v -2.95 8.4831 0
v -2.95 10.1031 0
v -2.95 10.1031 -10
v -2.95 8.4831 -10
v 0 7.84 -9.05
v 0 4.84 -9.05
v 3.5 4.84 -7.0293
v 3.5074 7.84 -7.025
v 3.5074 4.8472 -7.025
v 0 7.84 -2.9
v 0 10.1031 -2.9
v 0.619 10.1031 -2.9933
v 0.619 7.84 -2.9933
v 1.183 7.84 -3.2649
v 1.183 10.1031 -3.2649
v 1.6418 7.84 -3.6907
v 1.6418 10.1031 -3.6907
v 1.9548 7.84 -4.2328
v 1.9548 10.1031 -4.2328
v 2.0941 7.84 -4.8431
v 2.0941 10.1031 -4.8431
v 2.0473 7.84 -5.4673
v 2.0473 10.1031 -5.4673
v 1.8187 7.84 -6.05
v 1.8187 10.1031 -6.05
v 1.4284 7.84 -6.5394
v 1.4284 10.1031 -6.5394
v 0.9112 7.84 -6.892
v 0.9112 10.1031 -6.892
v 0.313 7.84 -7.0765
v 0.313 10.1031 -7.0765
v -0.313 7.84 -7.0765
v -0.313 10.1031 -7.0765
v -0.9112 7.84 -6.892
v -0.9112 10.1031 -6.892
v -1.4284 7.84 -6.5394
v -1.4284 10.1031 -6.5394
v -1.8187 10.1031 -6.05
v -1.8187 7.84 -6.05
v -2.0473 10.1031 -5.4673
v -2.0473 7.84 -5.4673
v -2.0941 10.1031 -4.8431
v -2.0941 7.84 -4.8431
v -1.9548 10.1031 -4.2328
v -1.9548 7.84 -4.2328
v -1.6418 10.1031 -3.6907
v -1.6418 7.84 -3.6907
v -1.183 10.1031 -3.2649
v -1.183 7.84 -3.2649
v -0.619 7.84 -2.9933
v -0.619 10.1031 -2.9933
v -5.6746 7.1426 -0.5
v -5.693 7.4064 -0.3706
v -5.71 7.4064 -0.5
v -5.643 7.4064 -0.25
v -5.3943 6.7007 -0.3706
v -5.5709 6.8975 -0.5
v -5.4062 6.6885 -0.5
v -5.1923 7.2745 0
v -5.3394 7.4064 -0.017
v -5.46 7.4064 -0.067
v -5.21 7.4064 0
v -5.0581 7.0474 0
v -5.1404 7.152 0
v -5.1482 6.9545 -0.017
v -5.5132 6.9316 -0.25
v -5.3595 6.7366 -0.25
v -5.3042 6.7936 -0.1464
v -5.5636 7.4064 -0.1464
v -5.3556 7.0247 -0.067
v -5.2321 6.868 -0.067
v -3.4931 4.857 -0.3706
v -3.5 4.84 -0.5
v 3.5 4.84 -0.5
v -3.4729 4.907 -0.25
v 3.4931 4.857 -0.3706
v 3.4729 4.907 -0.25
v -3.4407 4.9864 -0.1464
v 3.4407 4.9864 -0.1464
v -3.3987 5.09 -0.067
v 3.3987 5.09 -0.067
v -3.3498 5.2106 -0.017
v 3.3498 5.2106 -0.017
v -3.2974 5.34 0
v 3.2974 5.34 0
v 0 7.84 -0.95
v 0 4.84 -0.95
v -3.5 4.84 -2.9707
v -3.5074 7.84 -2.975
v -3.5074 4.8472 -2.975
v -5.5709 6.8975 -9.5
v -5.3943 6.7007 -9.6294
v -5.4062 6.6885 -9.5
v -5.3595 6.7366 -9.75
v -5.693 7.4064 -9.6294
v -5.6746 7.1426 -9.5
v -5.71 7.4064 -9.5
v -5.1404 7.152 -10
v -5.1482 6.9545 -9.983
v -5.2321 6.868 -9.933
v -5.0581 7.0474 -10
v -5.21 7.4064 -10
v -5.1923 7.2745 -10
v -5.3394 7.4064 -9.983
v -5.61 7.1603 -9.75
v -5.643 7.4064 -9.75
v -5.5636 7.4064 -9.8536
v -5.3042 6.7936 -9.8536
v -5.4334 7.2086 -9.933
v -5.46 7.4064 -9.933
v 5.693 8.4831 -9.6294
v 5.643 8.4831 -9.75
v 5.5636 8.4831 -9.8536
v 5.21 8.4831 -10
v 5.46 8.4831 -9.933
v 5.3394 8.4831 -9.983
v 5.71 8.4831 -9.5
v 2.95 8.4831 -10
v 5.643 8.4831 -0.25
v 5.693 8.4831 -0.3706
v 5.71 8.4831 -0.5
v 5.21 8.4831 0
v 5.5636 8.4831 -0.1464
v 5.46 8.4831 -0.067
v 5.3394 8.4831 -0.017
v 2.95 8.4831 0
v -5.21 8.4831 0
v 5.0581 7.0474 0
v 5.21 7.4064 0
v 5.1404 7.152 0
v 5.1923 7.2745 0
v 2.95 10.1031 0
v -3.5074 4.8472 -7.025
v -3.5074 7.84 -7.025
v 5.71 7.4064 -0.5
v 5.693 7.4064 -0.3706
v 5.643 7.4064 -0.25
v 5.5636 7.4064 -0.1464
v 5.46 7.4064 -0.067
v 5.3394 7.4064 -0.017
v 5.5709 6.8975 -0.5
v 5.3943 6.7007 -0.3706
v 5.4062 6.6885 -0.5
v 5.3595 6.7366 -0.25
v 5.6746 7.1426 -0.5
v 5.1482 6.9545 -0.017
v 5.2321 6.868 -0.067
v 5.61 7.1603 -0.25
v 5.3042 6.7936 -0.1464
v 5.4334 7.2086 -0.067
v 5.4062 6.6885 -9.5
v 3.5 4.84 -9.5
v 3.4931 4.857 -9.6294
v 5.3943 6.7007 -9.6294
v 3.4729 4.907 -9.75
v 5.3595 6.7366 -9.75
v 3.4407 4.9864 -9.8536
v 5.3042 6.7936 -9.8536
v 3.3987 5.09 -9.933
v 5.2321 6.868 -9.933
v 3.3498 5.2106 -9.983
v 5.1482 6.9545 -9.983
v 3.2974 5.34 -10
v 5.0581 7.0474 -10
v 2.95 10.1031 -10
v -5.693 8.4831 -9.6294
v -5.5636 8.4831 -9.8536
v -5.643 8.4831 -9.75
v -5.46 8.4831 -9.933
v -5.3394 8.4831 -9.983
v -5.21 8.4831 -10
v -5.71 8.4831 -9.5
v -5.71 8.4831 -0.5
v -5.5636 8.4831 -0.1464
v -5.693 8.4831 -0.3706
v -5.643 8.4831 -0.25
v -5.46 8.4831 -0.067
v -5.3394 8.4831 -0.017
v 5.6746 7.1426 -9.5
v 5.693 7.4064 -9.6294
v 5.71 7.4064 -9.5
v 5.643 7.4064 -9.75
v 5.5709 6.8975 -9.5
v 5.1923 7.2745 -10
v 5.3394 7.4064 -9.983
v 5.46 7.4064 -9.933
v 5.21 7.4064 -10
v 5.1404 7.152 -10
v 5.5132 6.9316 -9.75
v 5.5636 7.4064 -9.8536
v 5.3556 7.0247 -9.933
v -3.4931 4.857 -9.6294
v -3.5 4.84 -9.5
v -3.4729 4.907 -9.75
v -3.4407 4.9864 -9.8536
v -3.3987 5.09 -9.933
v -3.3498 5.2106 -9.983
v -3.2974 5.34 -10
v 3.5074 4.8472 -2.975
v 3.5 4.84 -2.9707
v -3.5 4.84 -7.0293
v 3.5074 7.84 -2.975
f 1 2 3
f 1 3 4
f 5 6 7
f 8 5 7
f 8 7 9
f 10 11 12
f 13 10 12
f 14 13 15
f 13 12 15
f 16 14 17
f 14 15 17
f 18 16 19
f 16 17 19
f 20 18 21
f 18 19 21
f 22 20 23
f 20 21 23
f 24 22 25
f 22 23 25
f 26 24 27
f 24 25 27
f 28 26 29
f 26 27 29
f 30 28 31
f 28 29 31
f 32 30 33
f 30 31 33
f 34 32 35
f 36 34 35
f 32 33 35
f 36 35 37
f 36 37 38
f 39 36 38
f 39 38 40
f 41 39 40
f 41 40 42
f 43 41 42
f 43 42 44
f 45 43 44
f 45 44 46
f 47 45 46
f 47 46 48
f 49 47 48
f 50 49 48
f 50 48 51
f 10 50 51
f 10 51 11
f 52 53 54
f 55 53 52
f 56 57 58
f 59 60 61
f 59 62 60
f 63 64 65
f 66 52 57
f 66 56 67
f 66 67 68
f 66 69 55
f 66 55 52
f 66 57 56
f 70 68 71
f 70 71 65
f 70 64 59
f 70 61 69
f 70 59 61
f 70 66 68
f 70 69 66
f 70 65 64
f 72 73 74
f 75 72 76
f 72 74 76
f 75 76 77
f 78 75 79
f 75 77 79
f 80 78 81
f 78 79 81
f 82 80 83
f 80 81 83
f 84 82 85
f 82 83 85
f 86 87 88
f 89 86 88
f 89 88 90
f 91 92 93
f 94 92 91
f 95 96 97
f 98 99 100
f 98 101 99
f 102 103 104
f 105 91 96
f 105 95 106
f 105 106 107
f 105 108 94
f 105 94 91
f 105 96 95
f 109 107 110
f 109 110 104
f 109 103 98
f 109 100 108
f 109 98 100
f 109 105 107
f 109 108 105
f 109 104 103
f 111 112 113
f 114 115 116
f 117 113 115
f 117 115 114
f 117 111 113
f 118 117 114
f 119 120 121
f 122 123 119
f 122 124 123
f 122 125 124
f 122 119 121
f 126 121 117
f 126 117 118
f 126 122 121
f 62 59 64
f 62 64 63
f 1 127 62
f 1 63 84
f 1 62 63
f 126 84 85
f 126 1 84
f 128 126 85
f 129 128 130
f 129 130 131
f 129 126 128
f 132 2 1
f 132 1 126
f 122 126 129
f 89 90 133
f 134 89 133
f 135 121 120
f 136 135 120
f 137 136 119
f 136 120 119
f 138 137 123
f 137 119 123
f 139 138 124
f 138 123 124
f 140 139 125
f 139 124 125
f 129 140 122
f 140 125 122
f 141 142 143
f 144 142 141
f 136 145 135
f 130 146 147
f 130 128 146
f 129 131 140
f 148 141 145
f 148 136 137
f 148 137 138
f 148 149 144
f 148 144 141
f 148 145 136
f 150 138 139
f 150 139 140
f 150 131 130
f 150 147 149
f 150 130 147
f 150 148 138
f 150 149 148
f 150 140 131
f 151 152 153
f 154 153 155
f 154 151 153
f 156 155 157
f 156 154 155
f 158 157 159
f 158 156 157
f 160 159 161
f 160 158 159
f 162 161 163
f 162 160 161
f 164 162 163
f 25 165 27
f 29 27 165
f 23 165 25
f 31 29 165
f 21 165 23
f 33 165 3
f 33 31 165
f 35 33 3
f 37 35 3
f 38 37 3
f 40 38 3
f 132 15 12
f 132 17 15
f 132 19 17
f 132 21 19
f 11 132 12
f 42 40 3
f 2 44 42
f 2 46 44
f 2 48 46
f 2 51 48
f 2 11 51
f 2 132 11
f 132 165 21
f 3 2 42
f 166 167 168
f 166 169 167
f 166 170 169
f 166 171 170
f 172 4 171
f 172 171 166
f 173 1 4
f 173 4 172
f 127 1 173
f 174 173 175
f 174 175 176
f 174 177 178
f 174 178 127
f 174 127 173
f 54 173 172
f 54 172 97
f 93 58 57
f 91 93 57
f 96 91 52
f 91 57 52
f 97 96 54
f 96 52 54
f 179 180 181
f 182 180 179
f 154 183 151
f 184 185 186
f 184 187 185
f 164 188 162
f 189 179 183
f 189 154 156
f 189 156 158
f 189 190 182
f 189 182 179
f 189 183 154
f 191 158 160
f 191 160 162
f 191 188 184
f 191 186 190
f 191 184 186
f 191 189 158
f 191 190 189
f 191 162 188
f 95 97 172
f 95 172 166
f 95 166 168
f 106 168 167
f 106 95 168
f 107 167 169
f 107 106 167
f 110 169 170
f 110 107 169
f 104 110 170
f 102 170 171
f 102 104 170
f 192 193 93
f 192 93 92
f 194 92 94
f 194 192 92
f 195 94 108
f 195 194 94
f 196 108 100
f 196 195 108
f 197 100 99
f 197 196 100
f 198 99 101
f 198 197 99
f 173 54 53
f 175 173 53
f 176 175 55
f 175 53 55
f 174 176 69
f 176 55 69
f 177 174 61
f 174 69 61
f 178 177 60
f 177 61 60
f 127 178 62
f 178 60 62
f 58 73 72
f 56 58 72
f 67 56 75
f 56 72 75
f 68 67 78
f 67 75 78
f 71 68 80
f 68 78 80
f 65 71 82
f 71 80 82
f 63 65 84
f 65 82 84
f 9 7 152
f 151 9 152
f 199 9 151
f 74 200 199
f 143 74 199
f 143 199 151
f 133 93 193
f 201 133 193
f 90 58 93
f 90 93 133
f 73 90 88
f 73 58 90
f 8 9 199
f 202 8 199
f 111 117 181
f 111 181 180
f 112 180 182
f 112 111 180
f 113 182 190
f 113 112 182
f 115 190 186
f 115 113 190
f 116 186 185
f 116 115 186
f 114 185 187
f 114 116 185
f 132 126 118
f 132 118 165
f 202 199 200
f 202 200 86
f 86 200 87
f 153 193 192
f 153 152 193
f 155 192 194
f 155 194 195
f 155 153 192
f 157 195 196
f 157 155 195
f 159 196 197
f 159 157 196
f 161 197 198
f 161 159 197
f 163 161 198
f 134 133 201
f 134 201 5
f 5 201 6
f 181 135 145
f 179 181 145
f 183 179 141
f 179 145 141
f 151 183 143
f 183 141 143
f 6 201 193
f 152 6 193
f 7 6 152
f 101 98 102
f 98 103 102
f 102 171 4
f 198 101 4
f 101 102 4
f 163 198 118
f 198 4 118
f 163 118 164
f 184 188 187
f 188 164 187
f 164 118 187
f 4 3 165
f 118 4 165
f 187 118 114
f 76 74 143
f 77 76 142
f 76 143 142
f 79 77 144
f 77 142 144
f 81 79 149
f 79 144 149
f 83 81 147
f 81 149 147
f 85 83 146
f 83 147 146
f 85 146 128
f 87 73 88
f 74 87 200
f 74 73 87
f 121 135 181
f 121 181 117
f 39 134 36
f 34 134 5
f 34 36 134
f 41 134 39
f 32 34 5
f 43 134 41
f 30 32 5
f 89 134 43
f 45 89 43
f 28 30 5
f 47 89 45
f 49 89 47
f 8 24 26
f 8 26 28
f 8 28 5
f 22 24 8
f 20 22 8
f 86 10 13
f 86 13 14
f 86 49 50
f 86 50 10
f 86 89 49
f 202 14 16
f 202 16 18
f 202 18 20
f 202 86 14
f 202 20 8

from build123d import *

# Parameters (mm, degrees)
BOSS_EXTRU_1_DEPTH      = 10
CONG_1_R                = 0.5
CONG_2_R                = 1
ESQUISSE2_R             = 2.1
ENL_V_MAT_EXTRU_1_DEPTH = 13.661149081102538
ENL_V_MAT_EXTRU_2_DEPTH = 3


with BuildPart() as part:
    # Esquisse1 → Boss.-Extru.1 (new body)
    with BuildSketch(Plane.XY):
        Polygon((-1.176e-14, 10.103135382441117), (-2.578e-14, 4.840000000000001), (3.5, 4.840000000000001), (5.71, 6.983135382441116), (5.71, 8.483135382441116), (2.95, 8.483135382441116), (2.95, 10.103135382441117), align=None)
        Polygon((-3.5, 4.840000000000001), (-2.576e-14, 4.840000000000001), (-1.176e-14, 10.103135382441117), (-2.95, 10.103135382441117), (-2.95, 8.483135382441116), (-5.71, 8.483135382441116), (-5.71, 6.983135382441116), align=None)
    extrude(amount=-BOSS_EXTRU_1_DEPTH)

    # Congé1
    cong_1_edges = [part.edges().sort_by_distance(p)[0] for p in [
        (5.71, 7.733135382441116, 0),
        (4.605, 5.911567691220558, 0),
        (0, 4.840000000000001, 0),
        (-4.605, 5.911567691220558, 0),
        (-5.71, 7.733135382441116, 0),
        (-5.71, 7.733135382441116, -10),
        (-4.605, 5.911567691220558, -10),
        (0, 4.840000000000001, -10),
        (4.605, 5.911567691220558, -10),
        (5.71, 7.733135382441116, -10),
    ]]
    fillet(cong_1_edges, radius=CONG_1_R)

    # Congé2
    # the kernel refuses this fillet: 1 mm, written as the material it takes off along each edge
    with BuildSketch(Plane(origin=(4.71, 7.4063748668930085, -10), x_dir=(1, 0, 0), z_dir=(0, 1, 0))) as cong_2_piece_1:
        with BuildLine():
            CenterArc((0.5, -0.5), 0.5, 0, 90)
            Line((1, -0.5), (1, 0))
            Line((1, 0), (0.5, 0))
        make_face()
    revolve(axis=Axis((4.71, 7.4063748668930085, -10), (0, 0, -1)), revolution_arc=45.87999999999987, mode=Mode.SUBTRACT)
    with BuildSketch(Plane(origin=(-4.710000000000001, 7.40637486689301, -10), x_dir=(-0.6961634275566162, -0.717883334625219, 0), z_dir=(0.717883334625219, -0.6961634275566162, 0))) as cong_2_piece_2:
        with BuildLine():
            CenterArc((0.5, -0.5), 0.5, 0, 90)
            Line((1, -0.5), (1, 0))
            Line((1, 0), (0.5, 0))
        make_face()
    revolve(axis=Axis((-4.710000000000001, 7.40637486689301, -10), (0, 0, -1)), revolution_arc=45.87999999999987, mode=Mode.SUBTRACT)
    with BuildSketch(Plane(origin=(4.71, 7.4063748668930085, 0), x_dir=(0.6961634275566162, -0.717883334625219, 0), z_dir=(-0.717883334625219, -0.6961634275566162, 0))) as cong_2_piece_3:
        with BuildLine():
            CenterArc((0.5, -0.5), 0.5, 0, 90)
            Line((1, -0.5), (1, 0))
            Line((1, 0), (0.5, 0))
        make_face()
    revolve(axis=Axis((4.71, 7.4063748668930085, 0), (0, 0, 1)), revolution_arc=45.87999999999987, mode=Mode.SUBTRACT)
    with BuildSketch(Plane(origin=(-4.710000000000001, 7.40637486689301, 0), x_dir=(-1, 0, 0), z_dir=(0, 1, 0))) as cong_2_piece_4:
        with BuildLine():
            CenterArc((0.5, -0.5), 0.5, 0, 90)
            Line((1, -0.5), (1, 0))
            Line((1, 0), (0.5, 0))
        make_face()
    revolve(axis=Axis((-4.710000000000001, 7.40637486689301, 0), (0, 0, 1)), revolution_arc=45.87999999999987, mode=Mode.SUBTRACT)
    with BuildSketch(Plane(origin=(-5.71, 6.983135382441116, 1.1e-16), x_dir=(0.717883334625219, -0.6961634275566161, 0), z_dir=(0, 0, -1))) as cong_2_piece_5:
        with BuildLine():
            CenterArc((CONG_2_R * 0.423239484452, -CONG_2_R), CONG_2_R, 90.00000000000003, 45.879999999999825)
            Line((-CONG_2_R * 0.294643850173, -CONG_2_R * 0.303836572443), (0, 0))
            Line((0, 0), (CONG_2_R * 0.423239484452, 0))
        make_face()
    extrude(amount=10, mode=Mode.SUBTRACT)
    with BuildSketch(Plane(origin=(5.71, 6.983135382441116, 1.1e-16), x_dir=(-0.7178833346252179, -0.6961634275566172, 0), z_dir=(0, 0, -1))) as cong_2_piece_6:
        with BuildLine():
            CenterArc((CONG_2_R * 0.423239484452, CONG_2_R), CONG_2_R, 224.12000000000015, 45.87999999999994)
            Line((-CONG_2_R * 0.294643850173, CONG_2_R * 0.303836572443), (0, 0))
            Line((0, 0), (CONG_2_R * 0.423239484452, 2e-17))
        make_face()
    extrude(amount=10, mode=Mode.SUBTRACT)

    # Esquisse2 → Enlèv. mat.-Extru.1 (cut, through all)
    with BuildSketch(Plane(origin=(0, 10.103135382441117, 0), x_dir=(1, 0, 0), z_dir=(0, 1, 0))):
        with Locations(Location((0, 5, 0), (0, 0, 270))):
            Circle(ESQUISSE2_R)
    extrude(amount=-ENL_V_MAT_EXTRU_1_DEPTH, mode=Mode.SUBTRACT)

    # Esquisse3 → Enlèv. mat.-Extru.2 (cut)
    with BuildSketch(Plane.XZ.offset(-4.840000000000001)):
        Polygon((0, -9.05), (3.5074028853269765, -7.025), (3.5074028853269774, -2.975), (5e-16, -0.9499999999999995), (-3.5074028853269774, -2.975), (-3.5074028853269774, -7.025000000000001), align=None)
    extrude(amount=-ENL_V_MAT_EXTRU_2_DEPTH, mode=Mode.SUBTRACT)


solid = part.part
